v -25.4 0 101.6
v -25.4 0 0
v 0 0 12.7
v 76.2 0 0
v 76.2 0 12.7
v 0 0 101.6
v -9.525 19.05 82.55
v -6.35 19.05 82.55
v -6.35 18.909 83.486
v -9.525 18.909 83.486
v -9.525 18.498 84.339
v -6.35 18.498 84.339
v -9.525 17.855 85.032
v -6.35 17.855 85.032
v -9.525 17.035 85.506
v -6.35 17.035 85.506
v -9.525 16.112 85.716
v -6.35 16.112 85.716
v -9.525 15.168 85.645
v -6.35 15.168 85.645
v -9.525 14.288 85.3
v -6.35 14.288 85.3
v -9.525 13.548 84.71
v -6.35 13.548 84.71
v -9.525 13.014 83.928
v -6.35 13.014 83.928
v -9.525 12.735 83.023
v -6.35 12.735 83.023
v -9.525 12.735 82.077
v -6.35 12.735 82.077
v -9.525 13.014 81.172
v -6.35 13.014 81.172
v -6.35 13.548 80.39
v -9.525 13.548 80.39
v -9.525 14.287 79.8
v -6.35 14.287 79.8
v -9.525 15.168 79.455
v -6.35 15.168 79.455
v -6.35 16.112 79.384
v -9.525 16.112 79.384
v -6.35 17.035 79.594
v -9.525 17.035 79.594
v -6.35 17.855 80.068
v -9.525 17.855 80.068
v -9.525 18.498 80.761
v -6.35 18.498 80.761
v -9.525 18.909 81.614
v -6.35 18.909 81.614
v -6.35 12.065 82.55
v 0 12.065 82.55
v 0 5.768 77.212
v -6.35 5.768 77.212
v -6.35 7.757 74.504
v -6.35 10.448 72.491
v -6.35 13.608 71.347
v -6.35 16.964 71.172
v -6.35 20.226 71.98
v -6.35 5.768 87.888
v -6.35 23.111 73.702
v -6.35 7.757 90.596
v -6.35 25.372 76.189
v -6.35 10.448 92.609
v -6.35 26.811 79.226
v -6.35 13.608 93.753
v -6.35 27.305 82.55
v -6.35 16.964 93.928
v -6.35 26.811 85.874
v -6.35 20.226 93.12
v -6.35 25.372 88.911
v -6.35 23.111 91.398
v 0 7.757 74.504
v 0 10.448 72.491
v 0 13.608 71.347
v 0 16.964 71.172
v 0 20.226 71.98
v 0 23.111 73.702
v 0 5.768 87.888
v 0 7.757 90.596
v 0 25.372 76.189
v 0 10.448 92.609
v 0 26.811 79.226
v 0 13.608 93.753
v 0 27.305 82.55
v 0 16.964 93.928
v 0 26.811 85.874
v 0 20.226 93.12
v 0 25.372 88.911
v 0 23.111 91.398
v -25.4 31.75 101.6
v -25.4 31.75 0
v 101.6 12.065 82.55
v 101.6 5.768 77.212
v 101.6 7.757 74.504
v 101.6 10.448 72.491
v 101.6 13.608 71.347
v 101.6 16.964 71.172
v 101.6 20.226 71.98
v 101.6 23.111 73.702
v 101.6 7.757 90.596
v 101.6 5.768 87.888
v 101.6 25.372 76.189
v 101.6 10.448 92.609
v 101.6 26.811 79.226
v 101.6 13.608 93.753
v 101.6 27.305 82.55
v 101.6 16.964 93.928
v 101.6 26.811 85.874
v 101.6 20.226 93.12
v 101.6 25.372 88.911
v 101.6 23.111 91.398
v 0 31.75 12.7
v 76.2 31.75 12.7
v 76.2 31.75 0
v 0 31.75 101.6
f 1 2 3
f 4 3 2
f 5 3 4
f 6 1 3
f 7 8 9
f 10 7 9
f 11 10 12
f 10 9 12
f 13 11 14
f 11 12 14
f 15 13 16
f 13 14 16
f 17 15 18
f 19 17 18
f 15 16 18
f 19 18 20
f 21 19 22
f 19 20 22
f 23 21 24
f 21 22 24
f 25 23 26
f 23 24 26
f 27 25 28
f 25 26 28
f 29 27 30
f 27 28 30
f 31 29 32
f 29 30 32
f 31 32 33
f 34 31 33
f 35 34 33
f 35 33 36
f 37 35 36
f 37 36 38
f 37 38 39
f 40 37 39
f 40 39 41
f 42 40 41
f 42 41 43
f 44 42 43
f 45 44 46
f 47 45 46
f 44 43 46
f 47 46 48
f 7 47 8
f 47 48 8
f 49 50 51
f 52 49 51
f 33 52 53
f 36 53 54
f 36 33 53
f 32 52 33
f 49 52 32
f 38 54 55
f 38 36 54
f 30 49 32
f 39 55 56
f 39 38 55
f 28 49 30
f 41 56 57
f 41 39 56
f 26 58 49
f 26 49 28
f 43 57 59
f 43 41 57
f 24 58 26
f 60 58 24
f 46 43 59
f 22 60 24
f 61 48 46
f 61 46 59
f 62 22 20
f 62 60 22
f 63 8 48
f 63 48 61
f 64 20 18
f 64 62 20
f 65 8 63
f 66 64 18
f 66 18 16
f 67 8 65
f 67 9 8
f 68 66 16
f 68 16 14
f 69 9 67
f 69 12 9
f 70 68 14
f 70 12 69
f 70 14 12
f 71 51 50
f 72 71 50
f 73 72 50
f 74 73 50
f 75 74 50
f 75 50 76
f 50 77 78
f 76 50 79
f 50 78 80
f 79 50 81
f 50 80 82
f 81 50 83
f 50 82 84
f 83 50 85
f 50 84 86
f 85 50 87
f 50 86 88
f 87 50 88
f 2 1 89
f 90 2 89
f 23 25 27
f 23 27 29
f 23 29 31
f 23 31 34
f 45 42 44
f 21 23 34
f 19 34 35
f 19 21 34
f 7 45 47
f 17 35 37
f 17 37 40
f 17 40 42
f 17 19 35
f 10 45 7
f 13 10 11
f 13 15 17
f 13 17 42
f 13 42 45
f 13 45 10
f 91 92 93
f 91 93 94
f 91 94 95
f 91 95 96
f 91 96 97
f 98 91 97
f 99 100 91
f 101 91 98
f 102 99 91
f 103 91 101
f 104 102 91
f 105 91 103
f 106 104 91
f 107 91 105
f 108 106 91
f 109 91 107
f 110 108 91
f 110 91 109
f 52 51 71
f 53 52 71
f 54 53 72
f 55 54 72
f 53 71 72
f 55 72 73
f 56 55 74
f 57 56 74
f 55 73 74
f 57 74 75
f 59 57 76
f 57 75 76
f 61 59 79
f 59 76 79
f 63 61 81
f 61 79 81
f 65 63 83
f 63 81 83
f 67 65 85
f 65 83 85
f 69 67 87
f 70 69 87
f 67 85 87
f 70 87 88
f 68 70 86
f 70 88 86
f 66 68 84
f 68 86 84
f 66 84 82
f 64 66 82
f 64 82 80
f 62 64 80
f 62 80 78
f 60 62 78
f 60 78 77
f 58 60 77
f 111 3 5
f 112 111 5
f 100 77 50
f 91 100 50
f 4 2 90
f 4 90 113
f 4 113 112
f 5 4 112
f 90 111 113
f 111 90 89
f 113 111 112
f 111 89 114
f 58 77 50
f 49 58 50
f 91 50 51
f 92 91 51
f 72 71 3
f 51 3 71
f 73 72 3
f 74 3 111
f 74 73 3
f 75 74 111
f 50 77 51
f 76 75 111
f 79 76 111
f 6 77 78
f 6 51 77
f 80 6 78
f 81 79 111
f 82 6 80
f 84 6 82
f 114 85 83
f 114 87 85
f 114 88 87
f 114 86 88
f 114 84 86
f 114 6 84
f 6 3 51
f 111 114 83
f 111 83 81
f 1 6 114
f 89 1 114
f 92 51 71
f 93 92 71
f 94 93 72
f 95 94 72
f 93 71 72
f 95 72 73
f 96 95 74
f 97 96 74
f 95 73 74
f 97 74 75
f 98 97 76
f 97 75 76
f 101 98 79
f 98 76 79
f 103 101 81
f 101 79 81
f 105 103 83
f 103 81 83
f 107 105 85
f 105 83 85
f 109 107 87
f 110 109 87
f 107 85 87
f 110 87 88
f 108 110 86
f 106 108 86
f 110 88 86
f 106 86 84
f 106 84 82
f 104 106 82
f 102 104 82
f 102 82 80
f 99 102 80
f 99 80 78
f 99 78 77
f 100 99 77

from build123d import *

# Parameters (mm, degrees)
F0_W     = 31.75
F0_H     = 101.6
F1_DEPTH = 25.4
F3_DEPTH = 6.35
F4_R     = 3.175
F5_DEPTH = 3.175
F6_W     = 76.2
F6_H     = 12.7
F7_DEPTH = 31.75
F8_DEPTH = 101.6


with BuildPart() as f1:
    # F0 (on Right) → F1 (new body)
    with BuildSketch(Plane.YZ):
        with Locations((15.875, 50.8)):
            Rectangle(F0_W, F0_H)
    extrude(amount=-F1_DEPTH)

    # F2 (on face) → F3 (cut)
    with BuildSketch(Plane.YZ):
        with BuildLine():
            Line((12.065, 82.55), (5.767917, 77.212232))
            ThreePointArc((5.767917, 77.212232), (27.305, 82.55), (5.767917, 87.887768))
            Line((5.767917, 87.887768), (12.065, 82.55))
        make_face()
    extrude(amount=-F3_DEPTH, mode=Mode.SUBTRACT)

    # F4 (on face) → F5 (cut)
    with BuildSketch(Plane.YZ.offset(-6.35)):
        with Locations((15.875, 82.55)):
            Circle(F4_R)
    extrude(amount=-F5_DEPTH, mode=Mode.SUBTRACT)

    # F6 (on face) → F7 (join)
    with BuildSketch(Plane.XZ):
        with Locations((38.1, 6.35)):
            Rectangle(F6_W, F6_H)
    extrude(amount=-F7_DEPTH)

    # F2 (on face) → F8 (join)
    with BuildSketch(Plane.YZ):
        with BuildLine():
            Line((12.065, 82.55), (5.767917, 77.212232))
            ThreePointArc((5.767917, 77.212232), (27.305, 82.55), (5.767917, 87.887768))
            Line((5.767917, 87.887768), (12.065, 82.55))
        make_face()
    extrude(amount=F8_DEPTH)


solid = f1.part
